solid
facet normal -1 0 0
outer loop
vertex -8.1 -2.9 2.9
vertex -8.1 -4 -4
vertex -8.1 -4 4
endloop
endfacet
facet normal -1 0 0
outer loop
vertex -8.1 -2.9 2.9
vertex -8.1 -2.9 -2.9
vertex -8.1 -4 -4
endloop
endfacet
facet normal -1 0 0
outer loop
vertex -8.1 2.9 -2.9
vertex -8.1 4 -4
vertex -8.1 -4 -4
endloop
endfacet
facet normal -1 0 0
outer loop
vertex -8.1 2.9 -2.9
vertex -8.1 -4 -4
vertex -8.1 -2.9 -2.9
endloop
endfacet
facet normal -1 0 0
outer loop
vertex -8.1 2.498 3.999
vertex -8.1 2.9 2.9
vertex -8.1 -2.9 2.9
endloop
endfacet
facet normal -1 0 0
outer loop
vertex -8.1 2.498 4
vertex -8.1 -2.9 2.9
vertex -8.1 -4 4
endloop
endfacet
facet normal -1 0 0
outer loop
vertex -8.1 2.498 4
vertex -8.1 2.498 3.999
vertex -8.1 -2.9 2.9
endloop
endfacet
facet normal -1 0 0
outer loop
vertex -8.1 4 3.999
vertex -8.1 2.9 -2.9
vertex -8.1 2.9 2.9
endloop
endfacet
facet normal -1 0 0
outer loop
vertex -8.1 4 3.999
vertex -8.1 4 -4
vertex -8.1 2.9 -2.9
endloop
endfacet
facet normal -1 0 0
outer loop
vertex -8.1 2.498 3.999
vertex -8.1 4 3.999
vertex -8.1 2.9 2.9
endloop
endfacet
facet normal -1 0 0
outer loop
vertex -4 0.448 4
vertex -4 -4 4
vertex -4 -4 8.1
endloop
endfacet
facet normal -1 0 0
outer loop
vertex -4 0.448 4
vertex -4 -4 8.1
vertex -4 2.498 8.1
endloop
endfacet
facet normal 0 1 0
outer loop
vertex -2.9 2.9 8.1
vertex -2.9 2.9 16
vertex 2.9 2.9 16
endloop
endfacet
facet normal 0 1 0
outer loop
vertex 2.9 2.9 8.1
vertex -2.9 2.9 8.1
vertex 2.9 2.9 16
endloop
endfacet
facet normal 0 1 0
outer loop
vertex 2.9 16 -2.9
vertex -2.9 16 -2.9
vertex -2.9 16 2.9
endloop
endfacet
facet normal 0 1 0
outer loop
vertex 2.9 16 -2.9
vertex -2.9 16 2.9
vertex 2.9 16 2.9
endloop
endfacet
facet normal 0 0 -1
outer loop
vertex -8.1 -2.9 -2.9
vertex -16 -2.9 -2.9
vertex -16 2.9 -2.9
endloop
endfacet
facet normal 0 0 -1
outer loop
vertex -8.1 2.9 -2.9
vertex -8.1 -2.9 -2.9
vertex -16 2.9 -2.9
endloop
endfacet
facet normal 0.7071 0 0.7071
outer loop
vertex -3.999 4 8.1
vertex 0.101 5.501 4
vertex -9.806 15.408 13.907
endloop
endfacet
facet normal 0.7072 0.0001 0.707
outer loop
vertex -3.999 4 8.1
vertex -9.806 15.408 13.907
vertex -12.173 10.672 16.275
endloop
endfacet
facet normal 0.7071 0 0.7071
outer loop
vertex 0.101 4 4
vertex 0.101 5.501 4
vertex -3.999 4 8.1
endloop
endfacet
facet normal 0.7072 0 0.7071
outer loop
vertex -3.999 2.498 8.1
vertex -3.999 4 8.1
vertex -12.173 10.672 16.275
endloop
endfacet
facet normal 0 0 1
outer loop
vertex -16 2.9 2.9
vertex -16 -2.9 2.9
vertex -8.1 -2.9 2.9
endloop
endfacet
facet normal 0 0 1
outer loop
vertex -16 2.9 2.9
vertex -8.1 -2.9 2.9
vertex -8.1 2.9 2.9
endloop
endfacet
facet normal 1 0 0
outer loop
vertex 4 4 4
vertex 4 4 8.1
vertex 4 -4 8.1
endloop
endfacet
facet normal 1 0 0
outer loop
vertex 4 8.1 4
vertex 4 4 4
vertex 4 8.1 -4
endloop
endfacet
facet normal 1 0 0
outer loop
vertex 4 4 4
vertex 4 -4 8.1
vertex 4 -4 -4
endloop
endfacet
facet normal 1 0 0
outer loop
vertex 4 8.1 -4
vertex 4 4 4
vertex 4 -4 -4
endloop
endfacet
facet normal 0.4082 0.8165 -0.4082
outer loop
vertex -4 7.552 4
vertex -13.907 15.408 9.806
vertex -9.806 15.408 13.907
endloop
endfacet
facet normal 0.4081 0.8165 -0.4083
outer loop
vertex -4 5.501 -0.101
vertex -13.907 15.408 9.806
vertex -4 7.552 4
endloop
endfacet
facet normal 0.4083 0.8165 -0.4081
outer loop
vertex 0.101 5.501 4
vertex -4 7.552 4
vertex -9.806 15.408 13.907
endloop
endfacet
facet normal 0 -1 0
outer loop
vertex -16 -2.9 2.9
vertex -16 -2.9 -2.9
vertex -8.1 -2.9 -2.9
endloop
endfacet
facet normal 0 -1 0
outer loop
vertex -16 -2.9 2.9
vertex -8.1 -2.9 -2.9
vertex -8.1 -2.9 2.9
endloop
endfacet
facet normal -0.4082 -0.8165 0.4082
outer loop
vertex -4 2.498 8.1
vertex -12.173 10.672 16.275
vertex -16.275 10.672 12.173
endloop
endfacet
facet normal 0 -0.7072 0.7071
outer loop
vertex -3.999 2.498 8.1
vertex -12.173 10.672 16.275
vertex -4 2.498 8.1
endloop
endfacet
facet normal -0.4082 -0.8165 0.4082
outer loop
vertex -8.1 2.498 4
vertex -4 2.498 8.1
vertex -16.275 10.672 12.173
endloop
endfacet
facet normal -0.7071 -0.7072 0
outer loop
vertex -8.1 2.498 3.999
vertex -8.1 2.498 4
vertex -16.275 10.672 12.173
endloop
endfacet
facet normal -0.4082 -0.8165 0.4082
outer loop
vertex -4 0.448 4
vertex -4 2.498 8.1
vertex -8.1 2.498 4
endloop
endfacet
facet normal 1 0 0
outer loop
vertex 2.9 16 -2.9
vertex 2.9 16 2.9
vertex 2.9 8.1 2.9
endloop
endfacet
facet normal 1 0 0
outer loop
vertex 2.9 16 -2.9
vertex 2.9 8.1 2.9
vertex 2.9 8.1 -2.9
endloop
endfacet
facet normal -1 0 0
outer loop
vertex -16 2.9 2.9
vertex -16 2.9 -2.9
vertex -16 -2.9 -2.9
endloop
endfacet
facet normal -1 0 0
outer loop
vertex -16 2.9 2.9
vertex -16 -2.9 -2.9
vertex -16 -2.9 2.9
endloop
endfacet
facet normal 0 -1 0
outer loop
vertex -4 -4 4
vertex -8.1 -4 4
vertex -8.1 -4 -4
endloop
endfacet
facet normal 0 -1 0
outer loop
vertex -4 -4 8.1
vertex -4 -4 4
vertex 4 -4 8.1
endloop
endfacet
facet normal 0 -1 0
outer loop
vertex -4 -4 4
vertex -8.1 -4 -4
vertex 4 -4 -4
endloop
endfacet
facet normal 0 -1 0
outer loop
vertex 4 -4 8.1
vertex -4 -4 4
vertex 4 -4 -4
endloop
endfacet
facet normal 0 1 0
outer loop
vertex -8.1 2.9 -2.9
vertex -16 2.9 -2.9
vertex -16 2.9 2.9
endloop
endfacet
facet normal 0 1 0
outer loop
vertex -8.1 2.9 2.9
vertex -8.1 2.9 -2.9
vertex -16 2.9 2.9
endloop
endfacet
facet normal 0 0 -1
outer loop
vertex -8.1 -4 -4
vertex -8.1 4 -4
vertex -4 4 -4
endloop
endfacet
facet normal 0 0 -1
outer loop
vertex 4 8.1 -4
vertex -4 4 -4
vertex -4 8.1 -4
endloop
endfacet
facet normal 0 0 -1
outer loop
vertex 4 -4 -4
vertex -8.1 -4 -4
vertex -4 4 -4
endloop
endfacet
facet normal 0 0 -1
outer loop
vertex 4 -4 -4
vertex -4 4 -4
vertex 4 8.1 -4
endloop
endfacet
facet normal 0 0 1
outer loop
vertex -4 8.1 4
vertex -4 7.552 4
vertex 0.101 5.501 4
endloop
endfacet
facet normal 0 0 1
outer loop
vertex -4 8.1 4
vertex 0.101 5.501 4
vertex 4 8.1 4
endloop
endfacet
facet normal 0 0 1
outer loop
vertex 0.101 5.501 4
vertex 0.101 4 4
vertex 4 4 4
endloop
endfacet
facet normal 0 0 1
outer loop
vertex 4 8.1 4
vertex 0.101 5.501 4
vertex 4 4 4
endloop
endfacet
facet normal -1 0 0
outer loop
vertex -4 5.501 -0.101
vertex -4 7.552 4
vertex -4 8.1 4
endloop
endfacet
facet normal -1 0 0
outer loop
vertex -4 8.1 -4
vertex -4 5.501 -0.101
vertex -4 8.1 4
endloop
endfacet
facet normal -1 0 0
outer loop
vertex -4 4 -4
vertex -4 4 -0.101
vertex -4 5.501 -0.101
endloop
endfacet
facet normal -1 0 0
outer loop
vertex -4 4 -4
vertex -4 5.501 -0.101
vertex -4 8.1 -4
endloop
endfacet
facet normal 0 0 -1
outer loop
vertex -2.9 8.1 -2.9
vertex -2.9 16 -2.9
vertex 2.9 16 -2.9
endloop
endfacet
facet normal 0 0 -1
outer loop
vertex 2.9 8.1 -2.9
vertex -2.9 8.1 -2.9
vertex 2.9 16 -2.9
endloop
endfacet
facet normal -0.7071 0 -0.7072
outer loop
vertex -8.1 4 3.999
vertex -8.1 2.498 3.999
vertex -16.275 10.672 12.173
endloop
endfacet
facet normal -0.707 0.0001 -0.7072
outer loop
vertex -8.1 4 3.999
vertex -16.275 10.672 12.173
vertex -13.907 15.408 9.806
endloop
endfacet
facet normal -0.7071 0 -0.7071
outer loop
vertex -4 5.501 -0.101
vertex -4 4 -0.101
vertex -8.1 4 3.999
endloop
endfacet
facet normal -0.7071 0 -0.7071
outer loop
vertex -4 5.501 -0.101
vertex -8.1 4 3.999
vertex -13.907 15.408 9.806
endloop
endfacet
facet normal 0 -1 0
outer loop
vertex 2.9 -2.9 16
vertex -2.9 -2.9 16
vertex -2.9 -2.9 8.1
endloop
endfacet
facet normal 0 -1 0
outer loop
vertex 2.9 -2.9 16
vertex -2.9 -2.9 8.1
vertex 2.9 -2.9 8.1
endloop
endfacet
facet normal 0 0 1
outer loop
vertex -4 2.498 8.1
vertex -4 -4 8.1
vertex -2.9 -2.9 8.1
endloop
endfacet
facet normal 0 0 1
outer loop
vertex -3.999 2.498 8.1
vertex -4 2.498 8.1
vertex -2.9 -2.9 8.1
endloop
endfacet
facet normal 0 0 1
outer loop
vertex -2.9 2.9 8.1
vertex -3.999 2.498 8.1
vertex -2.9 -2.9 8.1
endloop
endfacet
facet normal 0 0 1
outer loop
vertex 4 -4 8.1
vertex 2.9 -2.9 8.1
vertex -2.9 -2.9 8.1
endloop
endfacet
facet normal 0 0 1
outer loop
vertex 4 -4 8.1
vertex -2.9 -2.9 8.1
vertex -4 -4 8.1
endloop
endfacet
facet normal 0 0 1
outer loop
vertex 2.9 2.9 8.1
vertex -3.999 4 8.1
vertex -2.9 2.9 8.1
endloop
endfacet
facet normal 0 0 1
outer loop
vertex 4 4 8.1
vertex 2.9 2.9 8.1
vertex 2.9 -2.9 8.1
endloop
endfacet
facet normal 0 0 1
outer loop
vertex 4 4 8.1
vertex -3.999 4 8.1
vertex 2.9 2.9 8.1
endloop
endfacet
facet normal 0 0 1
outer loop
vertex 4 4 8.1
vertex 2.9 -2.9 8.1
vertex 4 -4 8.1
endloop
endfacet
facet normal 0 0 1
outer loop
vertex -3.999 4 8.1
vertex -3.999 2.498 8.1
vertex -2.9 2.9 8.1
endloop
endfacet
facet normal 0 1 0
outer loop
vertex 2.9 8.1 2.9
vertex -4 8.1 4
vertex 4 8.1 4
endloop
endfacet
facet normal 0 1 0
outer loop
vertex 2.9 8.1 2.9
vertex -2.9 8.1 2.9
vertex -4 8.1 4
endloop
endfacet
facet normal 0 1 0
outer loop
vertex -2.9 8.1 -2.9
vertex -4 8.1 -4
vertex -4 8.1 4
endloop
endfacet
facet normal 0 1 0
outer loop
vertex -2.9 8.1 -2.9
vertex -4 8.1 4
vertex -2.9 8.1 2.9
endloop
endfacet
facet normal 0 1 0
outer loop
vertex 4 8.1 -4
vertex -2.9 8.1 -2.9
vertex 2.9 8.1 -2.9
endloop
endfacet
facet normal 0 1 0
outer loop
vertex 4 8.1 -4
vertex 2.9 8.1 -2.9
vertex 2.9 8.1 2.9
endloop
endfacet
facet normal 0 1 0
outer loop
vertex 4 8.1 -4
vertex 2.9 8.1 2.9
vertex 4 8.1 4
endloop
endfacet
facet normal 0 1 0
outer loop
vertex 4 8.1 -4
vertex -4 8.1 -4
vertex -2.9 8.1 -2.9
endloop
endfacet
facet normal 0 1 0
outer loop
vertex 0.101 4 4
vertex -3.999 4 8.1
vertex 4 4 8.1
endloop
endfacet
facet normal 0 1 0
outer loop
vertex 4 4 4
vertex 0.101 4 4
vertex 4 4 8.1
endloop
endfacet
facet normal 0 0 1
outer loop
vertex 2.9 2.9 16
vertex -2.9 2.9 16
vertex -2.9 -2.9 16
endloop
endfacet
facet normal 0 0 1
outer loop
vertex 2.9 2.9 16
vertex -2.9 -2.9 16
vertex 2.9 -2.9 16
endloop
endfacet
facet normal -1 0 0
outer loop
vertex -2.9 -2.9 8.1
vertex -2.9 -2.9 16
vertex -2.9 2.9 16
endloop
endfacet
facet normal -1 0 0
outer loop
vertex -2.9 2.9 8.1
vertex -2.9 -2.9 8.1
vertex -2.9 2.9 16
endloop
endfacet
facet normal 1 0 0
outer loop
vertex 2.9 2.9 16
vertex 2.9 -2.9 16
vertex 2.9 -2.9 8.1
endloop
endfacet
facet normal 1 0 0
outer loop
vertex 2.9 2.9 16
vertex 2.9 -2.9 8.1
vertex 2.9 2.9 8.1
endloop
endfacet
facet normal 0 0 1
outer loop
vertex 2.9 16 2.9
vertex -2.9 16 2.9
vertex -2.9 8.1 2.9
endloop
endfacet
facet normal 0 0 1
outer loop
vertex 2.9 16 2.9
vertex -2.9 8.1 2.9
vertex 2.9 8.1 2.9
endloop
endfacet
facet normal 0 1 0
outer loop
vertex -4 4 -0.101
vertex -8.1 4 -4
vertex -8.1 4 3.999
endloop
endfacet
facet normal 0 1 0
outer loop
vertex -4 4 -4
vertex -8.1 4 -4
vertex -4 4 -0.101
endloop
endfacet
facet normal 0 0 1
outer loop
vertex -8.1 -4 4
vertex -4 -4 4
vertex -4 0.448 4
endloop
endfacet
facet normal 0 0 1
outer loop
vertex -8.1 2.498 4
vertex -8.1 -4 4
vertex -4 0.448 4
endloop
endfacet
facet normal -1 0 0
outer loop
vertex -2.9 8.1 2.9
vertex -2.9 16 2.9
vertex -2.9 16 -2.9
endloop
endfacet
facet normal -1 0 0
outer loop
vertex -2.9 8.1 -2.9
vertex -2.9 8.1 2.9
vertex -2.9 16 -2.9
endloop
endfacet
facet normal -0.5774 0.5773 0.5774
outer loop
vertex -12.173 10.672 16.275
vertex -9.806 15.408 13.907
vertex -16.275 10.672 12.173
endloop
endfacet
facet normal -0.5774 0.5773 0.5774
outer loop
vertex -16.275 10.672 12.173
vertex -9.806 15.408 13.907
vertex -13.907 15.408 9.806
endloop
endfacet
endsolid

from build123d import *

# Parameters (mm, degrees)
SKETCH1_W                       = 8
SKETCH1_H                       = 8
BOSS_EXTRUDE1_DEPTH             = 4
SKETCH3_W                       = 5.8
SKETCH3_H                       = 5.8
BOSS_EXTRUDE2_DEPTH             = 12
SKETCH5_W                       = 5.8
SKETCH5_H                       = 5.8
BOSS_EXTRUDE3_DEPTH             = 12
SKETCH6_W                       = 5.8
SKETCH6_H                       = 5.8
BOSS_EXTRUDE4_DEPTH             = 12
BOSS_EXTRUDE5_REACH             = 21.514
BOSS_EXTRUDE5_DIRECTION_2_DEPTH = 10
SKETCH9_W                       = 8
SKETCH9_H                       = 8
BOSS_EXTRUDE6_DEPTH             = 4.1
SKETCH10_W                      = 8
SKETCH10_H                      = 8
BOSS_EXTRUDE7_DEPTH             = 4.1
SKETCH11_W                      = 8
SKETCH11_H                      = 8
BOSS_EXTRUDE8_DEPTH             = 4.1


with BuildPart() as part:
    # Sketch1 → Boss-Extrude1 (new, symmetric)
    with BuildSketch(Plane(origin=(0, 0, 0), x_dir=(1, 0, 0), z_dir=(0, 1, 0))):
        Rectangle(SKETCH1_W, SKETCH1_H)
    extrude(amount=BOSS_EXTRUDE1_DEPTH, both=True)

    # Sketch3 → Boss-Extrude2 (add)
    with BuildSketch(Plane.XY.offset(4)):
        Rectangle(SKETCH3_W, SKETCH3_H)
    extrude(amount=BOSS_EXTRUDE2_DEPTH)

    # Sketch5 → Boss-Extrude3 (add)
    with BuildSketch(Plane(origin=(0, 4, 0), x_dir=(1, 0, 0), z_dir=(0, 1, 0))):
        Rectangle(SKETCH5_W, SKETCH5_H)
    extrude(amount=BOSS_EXTRUDE3_DEPTH)

    # Sketch6 → Boss-Extrude4 (add)
    with BuildSketch(Plane.ZY.offset(4)):
        Rectangle(SKETCH6_W, SKETCH6_H)
    extrude(amount=BOSS_EXTRUDE4_DEPTH)

    # Sketch8 → Boss-Extrude5 (add, up to next)
    with BuildSketch(Plane(origin=(-7.266666667, 7.266666667, 7.266666667), x_dir=(-0.8164965809277261, -0.4082482904638631, -0.408248290463863), z_dir=(0.5773502691896257, -0.5773502691896258, -0.5773502691896257)), mode=Mode.PRIVATE) as boss_extrude5_sk1:
        Polygon((1.061473671, 3.961473671), (-3.961473671, 1.061473671), (-1.061473671, -3.961473671), (3.961473671, -1.061473671), align=None)
    boss_extrude5_tool1 = extrude(boss_extrude5_sk1.sketch, amount=BOSS_EXTRUDE5_REACH, mode=Mode.PRIVATE) - part.part
    add(boss_extrude5_tool1.solids().sort_by_distance((-7.266667, 7.266667, 7.266667))[0])

    # Sketch8 → Boss-Extrude5 direction 2 (add)
    with BuildSketch(Plane(origin=(-7.266666667, 7.266666667, 7.266666667), x_dir=(-0.8164965809277261, -0.4082482904638631, -0.408248290463863), z_dir=(0.5773502691896257, -0.5773502691896258, -0.5773502691896257))):
        Polygon((1.061473671, 3.961473671), (-3.961473671, 1.061473671), (-1.061473671, -3.961473671), (3.961473671, -1.061473671), align=None)
    extrude(amount=-BOSS_EXTRUDE5_DIRECTION_2_DEPTH)

    # Sketch9 → Boss-Extrude6 (add)
    with BuildSketch(Plane.ZY.offset(4)):
        Rectangle(SKETCH9_W, SKETCH9_H)
    extrude(amount=BOSS_EXTRUDE6_DEPTH)

    # Sketch10 → Boss-Extrude7 (add)
    with BuildSketch(Plane.XY.offset(4)):
        Rectangle(SKETCH10_W, SKETCH10_H)
    extrude(amount=BOSS_EXTRUDE7_DEPTH)

    # Sketch11 → Boss-Extrude8 (add)
    with BuildSketch(Plane(origin=(0, 4, 0), x_dir=(1, 0, 0), z_dir=(0, 1, 0))):
        Rectangle(SKETCH11_W, SKETCH11_H)
    extrude(amount=BOSS_EXTRUDE8_DEPTH)


solid = part.part
